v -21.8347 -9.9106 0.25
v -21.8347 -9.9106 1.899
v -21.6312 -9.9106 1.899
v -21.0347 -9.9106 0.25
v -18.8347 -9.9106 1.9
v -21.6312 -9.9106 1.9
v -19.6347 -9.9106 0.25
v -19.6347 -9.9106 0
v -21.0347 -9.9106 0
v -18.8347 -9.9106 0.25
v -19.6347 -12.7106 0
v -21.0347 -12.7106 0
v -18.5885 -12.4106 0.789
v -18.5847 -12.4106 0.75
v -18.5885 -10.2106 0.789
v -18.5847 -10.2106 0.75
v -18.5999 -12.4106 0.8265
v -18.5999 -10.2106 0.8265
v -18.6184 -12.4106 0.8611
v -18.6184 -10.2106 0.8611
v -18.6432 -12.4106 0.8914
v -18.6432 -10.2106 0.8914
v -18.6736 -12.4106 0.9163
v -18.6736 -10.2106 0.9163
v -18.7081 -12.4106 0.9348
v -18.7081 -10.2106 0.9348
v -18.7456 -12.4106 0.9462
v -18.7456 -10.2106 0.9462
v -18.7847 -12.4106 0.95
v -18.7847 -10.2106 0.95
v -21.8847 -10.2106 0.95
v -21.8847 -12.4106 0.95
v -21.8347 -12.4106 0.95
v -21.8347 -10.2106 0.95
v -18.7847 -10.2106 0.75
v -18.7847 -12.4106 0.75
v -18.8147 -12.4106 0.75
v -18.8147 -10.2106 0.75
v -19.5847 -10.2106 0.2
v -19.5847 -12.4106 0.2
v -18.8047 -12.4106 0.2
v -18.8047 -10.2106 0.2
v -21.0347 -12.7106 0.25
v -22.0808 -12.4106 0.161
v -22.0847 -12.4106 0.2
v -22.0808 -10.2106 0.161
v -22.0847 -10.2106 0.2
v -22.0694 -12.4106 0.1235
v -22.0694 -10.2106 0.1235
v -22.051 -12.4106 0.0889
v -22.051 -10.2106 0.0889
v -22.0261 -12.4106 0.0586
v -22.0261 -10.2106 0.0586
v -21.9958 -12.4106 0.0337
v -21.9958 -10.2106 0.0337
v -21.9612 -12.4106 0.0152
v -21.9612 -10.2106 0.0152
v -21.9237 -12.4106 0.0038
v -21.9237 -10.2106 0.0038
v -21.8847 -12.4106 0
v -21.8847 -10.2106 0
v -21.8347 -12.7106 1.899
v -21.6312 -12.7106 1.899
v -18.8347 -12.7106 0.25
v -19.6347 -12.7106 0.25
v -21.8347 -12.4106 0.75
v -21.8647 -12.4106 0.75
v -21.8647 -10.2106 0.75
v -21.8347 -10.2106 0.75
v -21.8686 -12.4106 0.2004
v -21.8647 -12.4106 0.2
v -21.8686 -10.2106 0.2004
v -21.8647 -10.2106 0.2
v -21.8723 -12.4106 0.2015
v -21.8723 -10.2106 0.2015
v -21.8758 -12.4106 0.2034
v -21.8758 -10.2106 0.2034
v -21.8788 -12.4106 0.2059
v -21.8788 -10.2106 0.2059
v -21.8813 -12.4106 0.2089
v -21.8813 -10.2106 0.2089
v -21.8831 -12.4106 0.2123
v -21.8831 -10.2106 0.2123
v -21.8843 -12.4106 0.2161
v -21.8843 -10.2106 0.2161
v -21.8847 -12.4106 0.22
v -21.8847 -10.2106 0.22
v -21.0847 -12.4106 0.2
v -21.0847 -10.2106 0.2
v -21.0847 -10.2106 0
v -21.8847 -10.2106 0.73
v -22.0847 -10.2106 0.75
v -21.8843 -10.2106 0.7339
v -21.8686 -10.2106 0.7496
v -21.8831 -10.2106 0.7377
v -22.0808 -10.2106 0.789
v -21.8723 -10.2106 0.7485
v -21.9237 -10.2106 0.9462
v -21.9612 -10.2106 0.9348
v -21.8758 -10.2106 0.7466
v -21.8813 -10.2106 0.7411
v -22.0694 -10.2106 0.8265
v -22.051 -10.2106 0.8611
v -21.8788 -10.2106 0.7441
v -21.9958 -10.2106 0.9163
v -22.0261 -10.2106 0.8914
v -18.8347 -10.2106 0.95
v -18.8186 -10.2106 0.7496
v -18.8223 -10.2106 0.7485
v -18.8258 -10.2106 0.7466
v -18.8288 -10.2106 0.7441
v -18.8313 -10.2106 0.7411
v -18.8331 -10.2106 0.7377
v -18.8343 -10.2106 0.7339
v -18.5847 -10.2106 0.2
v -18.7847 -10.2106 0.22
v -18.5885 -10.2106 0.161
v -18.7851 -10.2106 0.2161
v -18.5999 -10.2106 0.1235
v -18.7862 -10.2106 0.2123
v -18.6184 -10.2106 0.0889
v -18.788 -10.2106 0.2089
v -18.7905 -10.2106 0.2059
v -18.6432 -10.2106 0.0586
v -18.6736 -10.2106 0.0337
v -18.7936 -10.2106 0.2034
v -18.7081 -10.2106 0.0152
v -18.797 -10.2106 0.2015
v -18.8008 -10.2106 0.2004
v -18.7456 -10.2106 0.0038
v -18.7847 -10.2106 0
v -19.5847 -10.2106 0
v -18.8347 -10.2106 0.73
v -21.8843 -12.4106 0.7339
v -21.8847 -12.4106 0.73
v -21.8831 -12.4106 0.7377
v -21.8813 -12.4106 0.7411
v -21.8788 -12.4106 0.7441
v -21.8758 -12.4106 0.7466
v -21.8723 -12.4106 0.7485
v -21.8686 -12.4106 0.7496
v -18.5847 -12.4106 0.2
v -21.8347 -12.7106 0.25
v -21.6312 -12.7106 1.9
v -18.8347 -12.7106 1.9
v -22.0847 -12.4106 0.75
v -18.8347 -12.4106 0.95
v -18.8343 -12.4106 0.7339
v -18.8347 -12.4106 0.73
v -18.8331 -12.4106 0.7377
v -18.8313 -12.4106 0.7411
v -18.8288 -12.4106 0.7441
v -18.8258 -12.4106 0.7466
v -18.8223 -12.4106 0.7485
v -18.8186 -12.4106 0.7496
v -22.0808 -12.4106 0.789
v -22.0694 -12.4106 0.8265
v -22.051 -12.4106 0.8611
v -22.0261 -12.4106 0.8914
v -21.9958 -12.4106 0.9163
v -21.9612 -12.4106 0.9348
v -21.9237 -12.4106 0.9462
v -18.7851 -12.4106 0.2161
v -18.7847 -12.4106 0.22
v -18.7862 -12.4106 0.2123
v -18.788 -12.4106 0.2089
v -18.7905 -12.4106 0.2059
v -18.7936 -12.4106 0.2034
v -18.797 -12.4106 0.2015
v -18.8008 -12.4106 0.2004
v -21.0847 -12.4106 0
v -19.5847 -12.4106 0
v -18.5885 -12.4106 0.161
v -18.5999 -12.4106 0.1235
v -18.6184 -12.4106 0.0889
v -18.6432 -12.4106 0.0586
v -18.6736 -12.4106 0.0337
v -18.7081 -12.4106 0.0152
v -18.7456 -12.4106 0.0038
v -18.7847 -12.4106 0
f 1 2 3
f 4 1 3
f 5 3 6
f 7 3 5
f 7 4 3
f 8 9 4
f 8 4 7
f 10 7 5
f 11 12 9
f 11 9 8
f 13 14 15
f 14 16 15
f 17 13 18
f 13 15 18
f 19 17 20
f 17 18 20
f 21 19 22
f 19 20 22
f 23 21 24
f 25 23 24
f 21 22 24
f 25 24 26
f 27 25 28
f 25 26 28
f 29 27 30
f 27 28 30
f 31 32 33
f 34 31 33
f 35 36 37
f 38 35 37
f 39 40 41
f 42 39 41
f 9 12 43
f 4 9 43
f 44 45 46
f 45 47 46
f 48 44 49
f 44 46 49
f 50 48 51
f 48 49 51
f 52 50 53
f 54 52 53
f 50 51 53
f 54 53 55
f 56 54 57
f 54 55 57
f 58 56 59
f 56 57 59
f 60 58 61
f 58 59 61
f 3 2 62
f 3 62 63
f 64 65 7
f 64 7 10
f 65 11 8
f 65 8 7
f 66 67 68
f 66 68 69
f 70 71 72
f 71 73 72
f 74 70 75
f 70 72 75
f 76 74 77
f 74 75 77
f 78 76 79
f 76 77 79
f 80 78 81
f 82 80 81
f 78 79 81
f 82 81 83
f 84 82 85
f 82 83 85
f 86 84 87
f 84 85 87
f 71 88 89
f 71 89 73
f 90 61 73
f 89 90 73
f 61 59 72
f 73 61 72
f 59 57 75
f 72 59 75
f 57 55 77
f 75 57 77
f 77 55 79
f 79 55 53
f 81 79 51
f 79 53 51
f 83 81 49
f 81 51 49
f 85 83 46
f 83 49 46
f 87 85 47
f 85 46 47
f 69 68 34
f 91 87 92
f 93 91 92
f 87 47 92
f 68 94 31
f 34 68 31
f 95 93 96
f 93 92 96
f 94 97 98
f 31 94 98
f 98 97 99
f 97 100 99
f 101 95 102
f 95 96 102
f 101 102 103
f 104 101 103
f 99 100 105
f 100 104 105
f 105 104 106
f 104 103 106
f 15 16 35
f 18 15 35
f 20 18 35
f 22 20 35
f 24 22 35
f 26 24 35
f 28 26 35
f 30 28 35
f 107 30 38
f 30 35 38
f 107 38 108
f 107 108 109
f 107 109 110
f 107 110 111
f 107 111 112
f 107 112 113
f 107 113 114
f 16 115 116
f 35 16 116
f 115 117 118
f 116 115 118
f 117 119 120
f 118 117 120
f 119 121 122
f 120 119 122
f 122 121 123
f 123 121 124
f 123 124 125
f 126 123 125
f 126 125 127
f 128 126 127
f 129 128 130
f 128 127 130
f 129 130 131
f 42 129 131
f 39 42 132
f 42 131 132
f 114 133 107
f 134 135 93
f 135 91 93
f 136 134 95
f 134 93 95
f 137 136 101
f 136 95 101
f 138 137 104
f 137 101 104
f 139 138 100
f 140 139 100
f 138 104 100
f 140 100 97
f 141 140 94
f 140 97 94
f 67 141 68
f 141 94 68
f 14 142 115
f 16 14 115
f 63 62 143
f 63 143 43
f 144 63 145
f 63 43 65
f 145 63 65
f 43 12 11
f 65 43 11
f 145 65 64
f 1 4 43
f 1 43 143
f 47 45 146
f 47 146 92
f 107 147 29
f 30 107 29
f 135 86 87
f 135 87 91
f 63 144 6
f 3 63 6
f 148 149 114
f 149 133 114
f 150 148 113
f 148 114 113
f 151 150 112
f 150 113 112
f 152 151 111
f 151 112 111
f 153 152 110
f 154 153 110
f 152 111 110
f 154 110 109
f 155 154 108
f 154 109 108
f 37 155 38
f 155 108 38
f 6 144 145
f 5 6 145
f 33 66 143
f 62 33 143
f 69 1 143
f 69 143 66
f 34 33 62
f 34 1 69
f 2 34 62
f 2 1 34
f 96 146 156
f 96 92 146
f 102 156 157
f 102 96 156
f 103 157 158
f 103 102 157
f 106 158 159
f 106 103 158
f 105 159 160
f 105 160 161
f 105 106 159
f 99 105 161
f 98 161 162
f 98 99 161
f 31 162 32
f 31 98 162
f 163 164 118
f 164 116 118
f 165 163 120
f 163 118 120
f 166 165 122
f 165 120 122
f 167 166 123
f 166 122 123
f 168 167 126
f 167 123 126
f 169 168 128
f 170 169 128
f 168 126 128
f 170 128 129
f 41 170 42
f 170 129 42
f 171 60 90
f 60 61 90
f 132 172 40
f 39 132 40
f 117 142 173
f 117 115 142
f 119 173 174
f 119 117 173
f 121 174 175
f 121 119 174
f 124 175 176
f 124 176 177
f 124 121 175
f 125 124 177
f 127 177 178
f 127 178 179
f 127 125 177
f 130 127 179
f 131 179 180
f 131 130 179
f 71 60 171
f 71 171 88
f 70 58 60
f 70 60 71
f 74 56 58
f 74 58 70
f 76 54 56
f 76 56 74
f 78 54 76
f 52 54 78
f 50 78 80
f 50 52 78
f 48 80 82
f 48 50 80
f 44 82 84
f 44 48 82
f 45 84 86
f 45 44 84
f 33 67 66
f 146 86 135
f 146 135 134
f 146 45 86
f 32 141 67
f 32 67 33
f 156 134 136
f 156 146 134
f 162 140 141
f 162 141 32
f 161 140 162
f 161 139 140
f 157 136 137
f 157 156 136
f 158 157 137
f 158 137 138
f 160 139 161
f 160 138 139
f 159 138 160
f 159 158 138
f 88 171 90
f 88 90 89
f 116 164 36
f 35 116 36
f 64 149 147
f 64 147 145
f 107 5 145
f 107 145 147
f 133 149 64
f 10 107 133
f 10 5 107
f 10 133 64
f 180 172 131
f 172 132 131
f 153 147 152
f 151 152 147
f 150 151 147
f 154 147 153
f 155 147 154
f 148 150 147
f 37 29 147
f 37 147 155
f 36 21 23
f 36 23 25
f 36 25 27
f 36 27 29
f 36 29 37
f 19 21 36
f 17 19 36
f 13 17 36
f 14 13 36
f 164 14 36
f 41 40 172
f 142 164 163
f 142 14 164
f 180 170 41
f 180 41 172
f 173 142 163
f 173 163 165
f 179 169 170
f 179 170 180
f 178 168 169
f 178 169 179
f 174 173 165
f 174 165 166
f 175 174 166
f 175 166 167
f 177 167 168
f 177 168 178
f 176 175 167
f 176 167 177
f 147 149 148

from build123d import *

# Parameters (mm, degrees)
SKETCH_1_W          = 3.5
SKETCH_1_H          = 2.8
EXTRUDE_1_DEPTH     = 1.9
CUT_EXTRUDE_2_REACH = 24.342
SKETCH_3_W          = 0.25
SKETCH_3_H          = 0.95
SKETCH_4_W          = 0.95
SKETCH_4_H          = 0.3
CUT_EXTRUDE_3_DEPTH = 0.25
SKETCH_5_W          = 0.95
SKETCH_5_H          = 0.3
CUT_EXTRUDE_4_DEPTH = 0.25
SKETCH_6_W          = 0.05
SKETCH_6_H          = 0.25
CUT_EXTRUDE_5_DEPTH = 23.342392493
SKETCH_7_W          = 0.75
SKETCH_7_H          = 0.3
CUT_EXTRUDE_6_DEPTH = 0.25
FILLET_1_R          = 0.2
CUT_EXTRUDE_7_DEPTH = 23.342392493
FILLET_2_R          = 0.02
SKETCH_9_W          = 0.203467288
SKETCH_9_H          = 2.8
CUT_EXTRUDE_8_DEPTH = 0.001


with BuildPart() as part:
    # 草图1 → 凸台-拉伸1 (new body)
    with BuildSketch(Plane.XY):
        with Locations((-20.334666678, -11.310599527)):
            Rectangle(SKETCH_1_W, SKETCH_1_H)
    extrude(amount=EXTRUDE_1_DEPTH)

    # 草图3 → 切除-拉伸2 (cut, up to next)
    with BuildSketch(Plane.XZ.offset(12.710599527), mode=Mode.PRIVATE) as cut_extrude_2_sk1:
        with Locations((-21.959666678, 1.425)):
            Rectangle(SKETCH_3_W, SKETCH_3_H)
    cut_extrude_2_tool1 = extrude(cut_extrude_2_sk1.sketch, amount=-CUT_EXTRUDE_2_REACH, mode=Mode.PRIVATE) & part.part
    # 草图3 → 切除-拉伸2 (cut, up to next)
    with BuildSketch(Plane.XZ.offset(12.710599527), mode=Mode.PRIVATE) as cut_extrude_2_sk2:
        with Locations((-18.709666678, 1.425)):
            Rectangle(SKETCH_3_W, SKETCH_3_H)
    cut_extrude_2_tool2 = extrude(cut_extrude_2_sk2.sketch, amount=-CUT_EXTRUDE_2_REACH, mode=Mode.PRIVATE) & part.part
    add(cut_extrude_2_tool1.solids().sort_by_distance((-21.959667, -12.7106, 1.425))[0], mode=Mode.SUBTRACT)
    add(cut_extrude_2_tool2.solids().sort_by_distance((-18.709667, -12.7106, 1.425))[0], mode=Mode.SUBTRACT)

    # 草图4 → 切除-拉伸3 (cut)
    with BuildSketch(Plane.ZY.offset(22.084666678)):
        with Locations((0.475, -12.560599527)):
            Rectangle(SKETCH_4_W, SKETCH_4_H)
        with Locations((0.475, -10.060599527)):
            Rectangle(SKETCH_4_W, SKETCH_4_H)
    extrude(amount=-CUT_EXTRUDE_3_DEPTH, mode=Mode.SUBTRACT)

    # 草图5 → 切除-拉伸4 (cut)
    with BuildSketch(Plane(origin=(-18.584666678, 0, 0), x_dir=(0, 0, -1), z_dir=(1, 0, 0))):
        with Locations((-0.475, -10.060599527)):
            Rectangle(SKETCH_5_W, SKETCH_5_H)
        with Locations((-0.475, -12.560599527)):
            Rectangle(SKETCH_5_W, SKETCH_5_H)
    extrude(amount=-CUT_EXTRUDE_4_DEPTH, mode=Mode.SUBTRACT)

    # 草图6 → 切除-拉伸5 (cut, through all)
    with BuildSketch(Plane.XZ.offset(12.710599527)):
        with Locations((-19.609666678, 0.125)):
            Rectangle(SKETCH_6_W, SKETCH_6_H)
        with Locations((-21.059666678, 0.125)):
            Rectangle(SKETCH_6_W, SKETCH_6_H)
    extrude(amount=-CUT_EXTRUDE_5_DEPTH, mode=Mode.SUBTRACT)

    # 草图7 → 切除-拉伸6 (cut)
    with BuildSketch(Plane(origin=(0, 0, 0), x_dir=(-1, 0, 0), z_dir=(0, 0, -1))):
        with Locations((19.209666678, -12.560599527)):
            Rectangle(SKETCH_7_W, SKETCH_7_H)
        with Locations((21.459666678, -12.560599527)):
            Rectangle(SKETCH_7_W, SKETCH_7_H)
        with Locations((19.209666678, -10.060599527)):
            Rectangle(SKETCH_7_W, SKETCH_7_H)
        with Locations((21.459666678, -10.060599527)):
            Rectangle(SKETCH_7_W, SKETCH_7_H)
    extrude(amount=-CUT_EXTRUDE_6_DEPTH, mode=Mode.SUBTRACT)

    # 圆角1
    fillet_1_edges = [part.edges().sort_by_distance(p)[0] for p in [
        (-22.084666678, -11.310599527, 0.95),
        (-22.084666678, -11.310599527, 0),
        (-18.584666678, -11.310599527, 0.95),
        (-18.584666678, -11.310599527, 0),
    ]]
    fillet(fillet_1_edges, radius=FILLET_1_R)

    # 草图8 → 切除-拉伸7 (cut, through all)
    with BuildSketch(Plane.XZ.offset(12.710599527)):
        Polygon((-21.084666678, 0.2), (-21.884666678, 0.2), (-21.884666678, 0.75), (-21.834666678, 0.75), (-21.834666678, 0.25), (-21.084666678, 0.25), align=None)
        Polygon((-19.584666678, 0.25), (-19.584666678, 0.2), (-18.784666678, 0.2), (-18.784666678, 0.75), (-18.834666678, 0.75), (-18.834666678, 0.25), align=None)
    extrude(amount=-CUT_EXTRUDE_7_DEPTH, mode=Mode.SUBTRACT)

    # 圆角2
    fillet_2_edges = [part.edges().sort_by_distance(p)[0] for p in [
        (-21.884666678, -11.310599527, 0.2),
        (-21.884666678, -11.310599527, 0.75),
        (-18.834666678, -11.310599527, 0.75),
        (-18.784666678, -11.310599527, 0.2),
    ]]
    fillet(fillet_2_edges, radius=FILLET_2_R)

    # 草图9 → 切除-拉伸8 (cut)
    with BuildSketch(Plane.XY.offset(1.9)):
        with Locations((-21.732933034, -11.310599527)):
            Rectangle(SKETCH_9_W, SKETCH_9_H)
    extrude(amount=-CUT_EXTRUDE_8_DEPTH, mode=Mode.SUBTRACT)


solid = part.part
